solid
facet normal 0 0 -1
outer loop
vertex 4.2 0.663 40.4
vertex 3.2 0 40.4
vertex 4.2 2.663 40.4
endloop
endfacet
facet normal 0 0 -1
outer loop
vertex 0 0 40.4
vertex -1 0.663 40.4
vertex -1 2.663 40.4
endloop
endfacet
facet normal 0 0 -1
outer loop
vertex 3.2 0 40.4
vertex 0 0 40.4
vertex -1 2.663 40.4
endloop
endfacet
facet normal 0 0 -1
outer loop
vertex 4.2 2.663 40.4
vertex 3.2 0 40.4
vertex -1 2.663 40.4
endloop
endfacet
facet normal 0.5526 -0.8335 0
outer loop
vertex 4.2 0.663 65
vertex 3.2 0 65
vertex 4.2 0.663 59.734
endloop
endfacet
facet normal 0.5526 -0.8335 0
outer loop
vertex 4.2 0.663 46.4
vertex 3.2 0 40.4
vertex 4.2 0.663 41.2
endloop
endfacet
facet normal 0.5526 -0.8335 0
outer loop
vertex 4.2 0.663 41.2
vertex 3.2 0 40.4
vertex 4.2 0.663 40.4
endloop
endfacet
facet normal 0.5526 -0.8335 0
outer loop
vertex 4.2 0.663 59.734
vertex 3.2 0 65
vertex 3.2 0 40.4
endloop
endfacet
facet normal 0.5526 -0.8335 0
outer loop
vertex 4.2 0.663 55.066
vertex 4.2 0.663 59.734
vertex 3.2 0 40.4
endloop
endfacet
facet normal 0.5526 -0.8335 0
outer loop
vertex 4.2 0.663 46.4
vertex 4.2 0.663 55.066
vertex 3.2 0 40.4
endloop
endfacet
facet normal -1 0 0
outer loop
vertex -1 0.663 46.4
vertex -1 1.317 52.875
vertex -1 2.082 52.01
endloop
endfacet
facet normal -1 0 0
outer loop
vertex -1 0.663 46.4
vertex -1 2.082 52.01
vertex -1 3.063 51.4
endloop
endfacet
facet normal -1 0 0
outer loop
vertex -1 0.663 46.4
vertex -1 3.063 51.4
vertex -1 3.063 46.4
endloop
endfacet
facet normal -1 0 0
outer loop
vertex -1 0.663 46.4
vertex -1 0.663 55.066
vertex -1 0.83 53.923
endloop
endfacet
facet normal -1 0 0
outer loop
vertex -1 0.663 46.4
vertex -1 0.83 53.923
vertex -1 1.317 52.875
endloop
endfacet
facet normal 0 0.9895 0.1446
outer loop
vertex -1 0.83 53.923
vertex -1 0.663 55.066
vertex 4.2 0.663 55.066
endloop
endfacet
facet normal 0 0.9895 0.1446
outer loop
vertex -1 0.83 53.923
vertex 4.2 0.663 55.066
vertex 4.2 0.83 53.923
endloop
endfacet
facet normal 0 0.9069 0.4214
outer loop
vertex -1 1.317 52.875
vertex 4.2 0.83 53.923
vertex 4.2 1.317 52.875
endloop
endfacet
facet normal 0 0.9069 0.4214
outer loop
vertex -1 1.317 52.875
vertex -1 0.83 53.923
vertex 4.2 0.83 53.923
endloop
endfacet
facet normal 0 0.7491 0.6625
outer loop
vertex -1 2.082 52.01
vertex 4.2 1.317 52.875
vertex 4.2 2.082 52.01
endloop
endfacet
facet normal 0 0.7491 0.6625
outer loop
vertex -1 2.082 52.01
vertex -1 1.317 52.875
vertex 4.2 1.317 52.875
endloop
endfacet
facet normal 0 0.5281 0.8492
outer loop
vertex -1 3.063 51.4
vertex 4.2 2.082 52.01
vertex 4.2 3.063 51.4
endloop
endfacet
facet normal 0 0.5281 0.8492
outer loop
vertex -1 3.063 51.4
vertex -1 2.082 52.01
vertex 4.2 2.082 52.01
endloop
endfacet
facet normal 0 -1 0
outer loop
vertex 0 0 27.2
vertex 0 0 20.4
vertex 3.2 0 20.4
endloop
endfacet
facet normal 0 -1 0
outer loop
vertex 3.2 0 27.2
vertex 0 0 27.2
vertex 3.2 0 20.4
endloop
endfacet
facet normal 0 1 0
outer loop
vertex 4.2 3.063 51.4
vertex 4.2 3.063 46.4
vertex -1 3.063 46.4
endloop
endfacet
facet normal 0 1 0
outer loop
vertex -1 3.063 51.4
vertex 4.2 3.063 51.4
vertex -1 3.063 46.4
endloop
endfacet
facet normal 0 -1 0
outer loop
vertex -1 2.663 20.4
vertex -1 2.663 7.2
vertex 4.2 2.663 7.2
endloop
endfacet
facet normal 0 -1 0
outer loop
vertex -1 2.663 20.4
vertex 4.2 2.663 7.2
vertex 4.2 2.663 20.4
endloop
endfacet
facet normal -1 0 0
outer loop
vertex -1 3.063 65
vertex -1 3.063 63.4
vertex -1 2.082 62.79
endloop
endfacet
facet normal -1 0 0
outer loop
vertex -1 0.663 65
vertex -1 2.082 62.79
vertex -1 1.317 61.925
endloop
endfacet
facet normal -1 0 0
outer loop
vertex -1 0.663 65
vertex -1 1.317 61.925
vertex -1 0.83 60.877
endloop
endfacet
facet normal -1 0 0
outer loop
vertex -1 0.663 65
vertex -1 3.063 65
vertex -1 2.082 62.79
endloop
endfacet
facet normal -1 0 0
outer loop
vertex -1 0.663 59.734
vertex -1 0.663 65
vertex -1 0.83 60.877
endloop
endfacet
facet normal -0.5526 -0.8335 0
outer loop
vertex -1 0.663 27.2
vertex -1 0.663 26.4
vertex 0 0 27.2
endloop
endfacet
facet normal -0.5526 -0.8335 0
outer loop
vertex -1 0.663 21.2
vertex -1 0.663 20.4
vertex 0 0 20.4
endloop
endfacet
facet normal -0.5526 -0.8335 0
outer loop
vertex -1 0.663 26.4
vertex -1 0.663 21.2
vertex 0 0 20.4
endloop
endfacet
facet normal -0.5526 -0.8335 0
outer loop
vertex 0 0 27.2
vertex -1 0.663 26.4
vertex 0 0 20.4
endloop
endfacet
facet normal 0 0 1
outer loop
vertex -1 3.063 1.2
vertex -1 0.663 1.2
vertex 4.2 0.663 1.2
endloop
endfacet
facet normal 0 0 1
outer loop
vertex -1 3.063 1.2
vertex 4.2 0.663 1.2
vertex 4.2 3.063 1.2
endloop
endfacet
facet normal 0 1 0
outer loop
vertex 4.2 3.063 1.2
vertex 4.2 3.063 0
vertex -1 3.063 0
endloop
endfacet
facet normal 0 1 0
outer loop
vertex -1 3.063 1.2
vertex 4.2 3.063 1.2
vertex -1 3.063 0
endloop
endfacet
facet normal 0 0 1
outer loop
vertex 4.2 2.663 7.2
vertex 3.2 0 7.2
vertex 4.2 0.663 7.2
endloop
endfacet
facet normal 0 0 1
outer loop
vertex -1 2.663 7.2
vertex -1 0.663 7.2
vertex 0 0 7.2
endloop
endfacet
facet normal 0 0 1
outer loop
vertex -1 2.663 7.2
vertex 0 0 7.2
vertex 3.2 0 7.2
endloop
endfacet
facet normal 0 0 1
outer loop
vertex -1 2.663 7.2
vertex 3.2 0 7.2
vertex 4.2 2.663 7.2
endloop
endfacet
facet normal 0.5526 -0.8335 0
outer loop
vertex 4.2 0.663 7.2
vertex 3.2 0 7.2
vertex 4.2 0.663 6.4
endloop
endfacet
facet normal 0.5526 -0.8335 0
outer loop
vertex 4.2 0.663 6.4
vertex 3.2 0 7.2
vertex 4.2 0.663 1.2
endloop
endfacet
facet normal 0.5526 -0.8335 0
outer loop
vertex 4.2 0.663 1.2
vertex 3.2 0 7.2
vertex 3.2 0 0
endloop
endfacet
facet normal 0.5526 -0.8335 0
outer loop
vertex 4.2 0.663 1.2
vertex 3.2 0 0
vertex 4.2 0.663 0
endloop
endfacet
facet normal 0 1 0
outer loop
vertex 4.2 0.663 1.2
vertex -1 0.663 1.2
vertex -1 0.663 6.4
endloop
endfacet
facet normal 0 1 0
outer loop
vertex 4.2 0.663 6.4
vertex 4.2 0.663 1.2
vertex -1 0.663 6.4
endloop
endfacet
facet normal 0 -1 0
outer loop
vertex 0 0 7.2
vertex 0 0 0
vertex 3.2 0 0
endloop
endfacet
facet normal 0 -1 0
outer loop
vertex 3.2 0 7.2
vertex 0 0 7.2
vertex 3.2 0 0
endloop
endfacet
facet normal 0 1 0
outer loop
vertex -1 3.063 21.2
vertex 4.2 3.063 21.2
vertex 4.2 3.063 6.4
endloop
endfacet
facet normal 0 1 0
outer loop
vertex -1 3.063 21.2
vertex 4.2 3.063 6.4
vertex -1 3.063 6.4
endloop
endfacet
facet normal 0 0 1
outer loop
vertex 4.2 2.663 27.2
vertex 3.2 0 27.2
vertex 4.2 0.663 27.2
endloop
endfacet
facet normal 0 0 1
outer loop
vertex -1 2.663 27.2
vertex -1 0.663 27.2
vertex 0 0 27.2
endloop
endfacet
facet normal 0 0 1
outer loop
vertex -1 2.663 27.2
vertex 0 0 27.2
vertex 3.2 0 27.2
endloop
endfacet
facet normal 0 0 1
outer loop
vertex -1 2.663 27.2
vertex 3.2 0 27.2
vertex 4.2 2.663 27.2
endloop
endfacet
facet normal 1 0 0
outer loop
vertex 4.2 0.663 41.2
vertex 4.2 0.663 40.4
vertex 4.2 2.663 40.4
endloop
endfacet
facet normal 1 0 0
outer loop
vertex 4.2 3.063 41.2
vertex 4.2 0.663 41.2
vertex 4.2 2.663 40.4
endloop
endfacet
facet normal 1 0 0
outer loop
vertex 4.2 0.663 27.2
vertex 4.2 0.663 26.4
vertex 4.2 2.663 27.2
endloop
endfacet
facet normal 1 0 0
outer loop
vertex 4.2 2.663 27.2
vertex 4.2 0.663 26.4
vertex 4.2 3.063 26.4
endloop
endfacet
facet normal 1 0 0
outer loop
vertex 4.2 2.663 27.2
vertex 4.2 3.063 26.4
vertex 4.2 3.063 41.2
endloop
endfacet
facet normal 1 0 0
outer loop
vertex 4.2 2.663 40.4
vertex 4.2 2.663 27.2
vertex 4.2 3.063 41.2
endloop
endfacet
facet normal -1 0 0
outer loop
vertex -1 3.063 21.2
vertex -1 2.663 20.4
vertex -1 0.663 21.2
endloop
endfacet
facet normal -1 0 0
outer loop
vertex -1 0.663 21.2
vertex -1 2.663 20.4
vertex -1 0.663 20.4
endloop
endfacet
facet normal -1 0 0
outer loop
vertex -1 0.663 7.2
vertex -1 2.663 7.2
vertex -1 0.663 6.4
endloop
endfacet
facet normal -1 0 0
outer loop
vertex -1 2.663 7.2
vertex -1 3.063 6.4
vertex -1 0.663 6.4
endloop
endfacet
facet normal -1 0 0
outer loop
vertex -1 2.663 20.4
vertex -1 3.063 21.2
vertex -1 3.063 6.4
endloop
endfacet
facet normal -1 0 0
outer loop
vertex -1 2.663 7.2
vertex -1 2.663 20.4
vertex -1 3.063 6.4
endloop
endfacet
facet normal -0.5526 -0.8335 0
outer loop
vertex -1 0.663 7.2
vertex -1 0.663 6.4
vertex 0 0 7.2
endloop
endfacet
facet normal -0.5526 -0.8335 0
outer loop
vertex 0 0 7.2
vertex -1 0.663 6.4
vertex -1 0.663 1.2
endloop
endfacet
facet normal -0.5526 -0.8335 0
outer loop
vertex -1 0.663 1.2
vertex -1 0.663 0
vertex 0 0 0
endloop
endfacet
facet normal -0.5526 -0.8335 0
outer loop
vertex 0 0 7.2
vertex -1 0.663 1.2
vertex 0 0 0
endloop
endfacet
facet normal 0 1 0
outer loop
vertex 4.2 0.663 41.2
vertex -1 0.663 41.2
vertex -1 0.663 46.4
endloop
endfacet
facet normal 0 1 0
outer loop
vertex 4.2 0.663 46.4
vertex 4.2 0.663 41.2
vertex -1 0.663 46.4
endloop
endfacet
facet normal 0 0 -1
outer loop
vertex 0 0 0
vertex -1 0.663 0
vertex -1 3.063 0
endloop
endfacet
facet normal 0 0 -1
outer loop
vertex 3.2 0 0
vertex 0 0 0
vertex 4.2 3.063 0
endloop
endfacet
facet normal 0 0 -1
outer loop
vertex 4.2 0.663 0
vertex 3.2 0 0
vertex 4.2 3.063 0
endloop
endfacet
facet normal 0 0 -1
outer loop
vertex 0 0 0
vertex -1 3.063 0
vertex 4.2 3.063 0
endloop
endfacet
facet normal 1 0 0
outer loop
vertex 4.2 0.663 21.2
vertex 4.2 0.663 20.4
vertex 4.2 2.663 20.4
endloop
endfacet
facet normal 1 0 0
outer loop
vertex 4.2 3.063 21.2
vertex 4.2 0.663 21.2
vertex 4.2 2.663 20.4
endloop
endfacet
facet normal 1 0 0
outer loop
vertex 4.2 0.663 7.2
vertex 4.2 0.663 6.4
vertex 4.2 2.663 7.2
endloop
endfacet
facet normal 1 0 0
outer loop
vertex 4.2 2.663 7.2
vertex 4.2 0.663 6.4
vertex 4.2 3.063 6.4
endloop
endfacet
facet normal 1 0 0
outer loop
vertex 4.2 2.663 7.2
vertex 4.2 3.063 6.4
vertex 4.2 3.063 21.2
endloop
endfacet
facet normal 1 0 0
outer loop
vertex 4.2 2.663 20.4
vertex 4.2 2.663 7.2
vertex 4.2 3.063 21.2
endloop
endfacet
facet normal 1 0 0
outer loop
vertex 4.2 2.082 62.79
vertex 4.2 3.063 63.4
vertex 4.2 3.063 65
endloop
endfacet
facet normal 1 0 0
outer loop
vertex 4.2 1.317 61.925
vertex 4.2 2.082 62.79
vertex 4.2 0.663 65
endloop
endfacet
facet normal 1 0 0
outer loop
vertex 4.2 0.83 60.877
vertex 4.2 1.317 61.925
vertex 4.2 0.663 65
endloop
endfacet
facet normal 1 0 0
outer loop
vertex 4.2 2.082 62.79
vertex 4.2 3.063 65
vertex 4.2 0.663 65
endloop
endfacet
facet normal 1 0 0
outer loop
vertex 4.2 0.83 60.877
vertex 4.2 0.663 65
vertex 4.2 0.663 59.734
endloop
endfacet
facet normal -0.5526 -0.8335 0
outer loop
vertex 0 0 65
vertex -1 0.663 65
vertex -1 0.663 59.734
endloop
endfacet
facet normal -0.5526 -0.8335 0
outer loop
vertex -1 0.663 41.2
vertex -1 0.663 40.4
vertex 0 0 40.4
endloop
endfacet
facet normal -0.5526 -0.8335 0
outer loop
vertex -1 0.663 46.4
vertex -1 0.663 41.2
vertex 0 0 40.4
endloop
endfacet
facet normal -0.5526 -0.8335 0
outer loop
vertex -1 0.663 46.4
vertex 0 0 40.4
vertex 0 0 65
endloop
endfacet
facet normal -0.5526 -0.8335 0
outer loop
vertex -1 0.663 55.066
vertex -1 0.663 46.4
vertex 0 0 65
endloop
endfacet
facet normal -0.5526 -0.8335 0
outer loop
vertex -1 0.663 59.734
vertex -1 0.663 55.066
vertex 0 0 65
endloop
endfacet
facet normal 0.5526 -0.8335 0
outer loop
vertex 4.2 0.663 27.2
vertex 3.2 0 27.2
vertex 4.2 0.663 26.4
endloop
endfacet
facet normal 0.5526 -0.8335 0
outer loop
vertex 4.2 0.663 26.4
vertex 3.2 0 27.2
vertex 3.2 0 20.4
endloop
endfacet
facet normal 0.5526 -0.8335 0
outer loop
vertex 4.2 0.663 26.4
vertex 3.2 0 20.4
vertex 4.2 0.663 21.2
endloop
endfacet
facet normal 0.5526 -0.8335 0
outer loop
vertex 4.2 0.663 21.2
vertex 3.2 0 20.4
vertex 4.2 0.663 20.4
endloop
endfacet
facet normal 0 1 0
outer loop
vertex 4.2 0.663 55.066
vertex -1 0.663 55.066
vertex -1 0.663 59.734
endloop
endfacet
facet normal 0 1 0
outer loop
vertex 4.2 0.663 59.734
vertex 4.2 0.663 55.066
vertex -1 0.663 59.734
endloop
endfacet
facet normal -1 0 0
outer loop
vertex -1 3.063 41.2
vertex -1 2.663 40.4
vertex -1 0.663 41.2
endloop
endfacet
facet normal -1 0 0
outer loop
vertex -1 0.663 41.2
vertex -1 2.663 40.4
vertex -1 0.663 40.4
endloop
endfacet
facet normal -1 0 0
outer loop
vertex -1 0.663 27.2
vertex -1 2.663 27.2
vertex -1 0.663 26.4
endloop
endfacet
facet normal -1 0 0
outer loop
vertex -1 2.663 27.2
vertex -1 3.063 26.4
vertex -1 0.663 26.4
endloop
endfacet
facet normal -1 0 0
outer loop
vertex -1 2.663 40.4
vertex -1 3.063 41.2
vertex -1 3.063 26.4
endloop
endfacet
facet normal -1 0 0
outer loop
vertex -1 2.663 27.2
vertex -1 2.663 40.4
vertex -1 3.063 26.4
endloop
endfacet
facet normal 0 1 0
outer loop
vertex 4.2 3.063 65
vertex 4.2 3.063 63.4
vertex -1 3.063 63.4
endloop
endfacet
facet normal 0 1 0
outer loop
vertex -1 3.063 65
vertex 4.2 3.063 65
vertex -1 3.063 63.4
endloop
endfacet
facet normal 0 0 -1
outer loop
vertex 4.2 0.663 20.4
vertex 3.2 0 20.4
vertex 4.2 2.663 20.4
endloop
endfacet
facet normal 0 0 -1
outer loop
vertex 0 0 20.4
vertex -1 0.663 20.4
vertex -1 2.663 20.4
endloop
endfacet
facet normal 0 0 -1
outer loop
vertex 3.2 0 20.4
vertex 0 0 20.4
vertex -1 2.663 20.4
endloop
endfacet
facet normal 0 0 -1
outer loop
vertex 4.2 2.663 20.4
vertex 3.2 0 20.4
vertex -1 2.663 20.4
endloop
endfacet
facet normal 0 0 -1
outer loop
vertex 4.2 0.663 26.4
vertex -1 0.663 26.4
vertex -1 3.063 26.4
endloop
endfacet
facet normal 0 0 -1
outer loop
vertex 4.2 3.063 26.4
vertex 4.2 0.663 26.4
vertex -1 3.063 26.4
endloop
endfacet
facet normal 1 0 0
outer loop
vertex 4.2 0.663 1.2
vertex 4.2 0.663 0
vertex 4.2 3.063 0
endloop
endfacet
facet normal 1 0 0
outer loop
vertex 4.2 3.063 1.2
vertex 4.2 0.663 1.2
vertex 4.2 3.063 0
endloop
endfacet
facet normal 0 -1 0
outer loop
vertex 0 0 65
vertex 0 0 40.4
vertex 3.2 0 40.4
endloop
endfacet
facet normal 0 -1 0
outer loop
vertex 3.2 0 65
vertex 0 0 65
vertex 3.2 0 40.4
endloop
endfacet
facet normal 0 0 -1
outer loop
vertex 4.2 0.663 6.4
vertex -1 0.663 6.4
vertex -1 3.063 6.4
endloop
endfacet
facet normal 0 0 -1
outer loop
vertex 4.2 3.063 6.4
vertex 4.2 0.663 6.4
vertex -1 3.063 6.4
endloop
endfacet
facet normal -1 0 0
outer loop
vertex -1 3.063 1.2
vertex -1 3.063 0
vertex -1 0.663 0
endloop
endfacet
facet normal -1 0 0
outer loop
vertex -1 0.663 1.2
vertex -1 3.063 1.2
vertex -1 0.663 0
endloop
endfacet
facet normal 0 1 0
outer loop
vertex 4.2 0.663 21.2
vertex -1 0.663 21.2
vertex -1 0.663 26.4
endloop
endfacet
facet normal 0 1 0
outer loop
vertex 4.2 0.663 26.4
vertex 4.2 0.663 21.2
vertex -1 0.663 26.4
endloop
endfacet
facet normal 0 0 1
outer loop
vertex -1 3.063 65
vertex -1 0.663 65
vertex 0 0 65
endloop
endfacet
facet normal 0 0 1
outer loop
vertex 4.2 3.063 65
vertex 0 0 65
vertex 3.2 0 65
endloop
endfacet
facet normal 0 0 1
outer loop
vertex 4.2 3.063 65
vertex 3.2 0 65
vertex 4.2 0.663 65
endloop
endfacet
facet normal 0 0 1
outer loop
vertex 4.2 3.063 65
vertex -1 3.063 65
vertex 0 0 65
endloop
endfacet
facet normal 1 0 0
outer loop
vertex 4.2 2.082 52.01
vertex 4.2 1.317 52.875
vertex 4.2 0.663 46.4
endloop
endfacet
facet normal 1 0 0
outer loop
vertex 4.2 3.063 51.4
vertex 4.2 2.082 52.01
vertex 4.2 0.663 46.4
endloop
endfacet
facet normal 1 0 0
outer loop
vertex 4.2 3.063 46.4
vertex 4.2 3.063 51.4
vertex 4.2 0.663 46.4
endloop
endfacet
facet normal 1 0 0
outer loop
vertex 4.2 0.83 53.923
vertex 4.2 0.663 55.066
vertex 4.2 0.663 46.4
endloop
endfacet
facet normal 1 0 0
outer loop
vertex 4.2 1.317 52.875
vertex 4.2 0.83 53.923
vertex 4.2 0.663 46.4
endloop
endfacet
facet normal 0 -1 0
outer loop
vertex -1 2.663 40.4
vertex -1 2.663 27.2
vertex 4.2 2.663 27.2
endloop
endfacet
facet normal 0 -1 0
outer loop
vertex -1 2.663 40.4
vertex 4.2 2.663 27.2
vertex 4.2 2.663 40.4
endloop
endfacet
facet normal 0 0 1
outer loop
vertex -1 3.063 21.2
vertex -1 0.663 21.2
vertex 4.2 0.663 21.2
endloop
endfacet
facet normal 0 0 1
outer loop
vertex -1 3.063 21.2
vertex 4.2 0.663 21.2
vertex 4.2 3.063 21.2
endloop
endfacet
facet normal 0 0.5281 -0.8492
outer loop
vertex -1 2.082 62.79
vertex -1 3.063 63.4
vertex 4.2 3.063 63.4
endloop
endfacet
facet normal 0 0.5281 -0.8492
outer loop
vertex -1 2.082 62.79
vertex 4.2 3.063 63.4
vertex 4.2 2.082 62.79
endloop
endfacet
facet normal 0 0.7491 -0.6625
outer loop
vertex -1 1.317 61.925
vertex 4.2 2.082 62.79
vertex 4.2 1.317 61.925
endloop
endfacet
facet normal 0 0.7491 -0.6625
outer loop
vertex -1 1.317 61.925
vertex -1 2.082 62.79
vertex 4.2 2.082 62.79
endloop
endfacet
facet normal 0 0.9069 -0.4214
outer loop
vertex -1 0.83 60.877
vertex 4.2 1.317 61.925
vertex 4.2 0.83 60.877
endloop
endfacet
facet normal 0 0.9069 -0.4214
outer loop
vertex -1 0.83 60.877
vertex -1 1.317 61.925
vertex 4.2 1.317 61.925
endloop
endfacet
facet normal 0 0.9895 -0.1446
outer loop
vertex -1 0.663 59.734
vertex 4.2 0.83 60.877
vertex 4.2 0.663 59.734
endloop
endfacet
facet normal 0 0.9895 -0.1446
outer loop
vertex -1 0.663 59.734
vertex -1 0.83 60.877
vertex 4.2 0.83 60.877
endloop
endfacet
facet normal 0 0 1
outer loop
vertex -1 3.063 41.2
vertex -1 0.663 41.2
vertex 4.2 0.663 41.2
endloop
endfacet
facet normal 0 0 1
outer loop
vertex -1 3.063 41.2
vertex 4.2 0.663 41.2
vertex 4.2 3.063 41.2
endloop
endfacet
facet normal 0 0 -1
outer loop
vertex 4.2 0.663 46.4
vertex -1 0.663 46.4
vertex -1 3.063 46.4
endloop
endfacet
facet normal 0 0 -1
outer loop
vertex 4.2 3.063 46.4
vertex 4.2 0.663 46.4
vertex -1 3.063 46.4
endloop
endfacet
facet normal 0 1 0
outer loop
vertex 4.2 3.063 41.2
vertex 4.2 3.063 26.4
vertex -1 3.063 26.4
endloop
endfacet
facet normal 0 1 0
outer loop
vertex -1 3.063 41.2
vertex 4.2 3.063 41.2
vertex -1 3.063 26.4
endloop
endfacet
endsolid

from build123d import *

# Parameters (mm, degrees)
BOSS_EXTRUDE1_DEPTH = 65
SKETCH2_W           = 5.2
SKETCH2_H           = 2.4
CUT_EXTRUDE1_DEPTH  = 6
LPATTERN1_COUNT     = 3
LPATTERN1_PITCH     = 20
SKETCH3_W           = 12
SKETCH3_H           = 2.4
CUT_EXTRUDE2_DEPTH  = 6
FILLET1_R           = 4
FILLET2_R           = 4
SKETCH5_W           = 13.2
SKETCH5_H           = 3.1
CUT_EXTRUDE3_DEPTH  = 10
LPATTERN2_COUNT     = 2
LPATTERN2_PITCH     = 20


with BuildPart() as part:
    # Sketch1 → Boss-Extrude1 (new body)
    with BuildSketch(Plane.XY):
        Polygon((0, 0), (3.2, 0), (4.2, 0.663324958), (4.2, 3.063324958), (-1, 3.063324958), (-1, 0.663324958), align=None)
    extrude(amount=BOSS_EXTRUDE1_DEPTH)

    # Sketch2 → Cut-Extrude1 (cut)
    with BuildSketch(Plane.ZY.offset(1)):
        with Locations((3.8, 1.863324958)):
            Rectangle(SKETCH2_W, SKETCH2_H)
    cut_extrude1 = extrude(amount=-CUT_EXTRUDE1_DEPTH, mode=Mode.SUBTRACT)

    # LPattern1: Cut-Extrude1 ×3
    with Locations(*[(0, 0, i * LPATTERN1_PITCH) for i in range(1, LPATTERN1_COUNT)]):
        add(cut_extrude1, mode=Mode.SUBTRACT)

    # Sketch3 → Cut-Extrude2 (cut)
    with BuildSketch(Plane.ZY.offset(1)):
        with Locations((57.4, 1.863324958)):
            Rectangle(SKETCH3_W, SKETCH3_H)
    extrude(amount=-CUT_EXTRUDE2_DEPTH, mode=Mode.SUBTRACT)

    # Fillet1
    # the kernel refuses this fillet: 4 mm, written as the material it adds along each edge
    with BuildSketch(Plane(origin=(-1, 0.663324958, 51.4), x_dir=(0, 0, 1), z_dir=(1, 0, 0))) as fillet1_piece_1_section:
        with BuildLine():
            CenterArc((3.666060556, -4), FILLET1_R, 90, 66.421821522)
            Line((0, -2.4), (-0.073321211, -2.368))
            ThreePointArc((-0.073321211, -2.368), (-0.08, -1.2), (-0.08, 0))
            Line((-0.08, 0), (0, 0.08))
            Line((0, 0.08), (3.666060556, 0.08))
            Line((3.666060556, 0.08), (3.666060556, 0))
        make_face()
    fillet1_piece_1 = extrude(amount=5.2, mode=Mode.PRIVATE)
    fillet1_piece_1 = split(fillet1_piece_1, bisect_by=Plane(origin=(0.518931728, -0.344220367, 52.290586237), z_dir=(0.5527707983925672, 0.833333333333333, 0)), keep=Keep.TOP, mode=Mode.PRIVATE)
    fillet1_piece_1 = split(fillet1_piece_1, bisect_by=Plane(origin=(2.681068272, -0.344220367, 52.290586237), z_dir=(-0.5527707983925666, 0.8333333333333335, 0)), keep=Keep.TOP, mode=Mode.PRIVATE)
    add(fillet1_piece_1)

    # Fillet2
    # the kernel refuses this fillet: 4 mm, written as the material it adds along each edge
    with BuildSketch(Plane(origin=(-1, 0.663324958, 63.4), x_dir=(0, 1, 0), z_dir=(1, 0, 0))) as fillet2_piece_1_section:
        with BuildLine():
            CenterArc((4, -3.666060556), FILLET2_R, 113.578178478, 66.421821522)
            Line((0, -3.666060556), (-0.08, -3.666060556))
            Line((-0.08, -3.666060556), (-0.08, 0))
            Line((-0.08, 0), (0, 0.08))
            ThreePointArc((0, 0.08), (1.2, 0.08), (2.368, 0.073321211))
            Line((2.368, 0.073321211), (2.4, 0))
        make_face()
    fillet2_piece_1 = extrude(amount=5.2, mode=Mode.PRIVATE)
    fillet2_piece_1 = split(fillet2_piece_1, bisect_by=Plane(origin=(2.681068272, -0.344220367, 62.509413763), z_dir=(-0.5527707983925666, 0.8333333333333335, 0)), keep=Keep.TOP, mode=Mode.PRIVATE)
    fillet2_piece_1 = split(fillet2_piece_1, bisect_by=Plane(origin=(0.518931728, -0.344220367, 62.509413763), z_dir=(0.5527707983925672, 0.833333333333333, 0)), keep=Keep.TOP, mode=Mode.PRIVATE)
    add(fillet2_piece_1)

    # Sketch5 → Cut-Extrude3 (cut)
    with BuildSketch(Plane.ZY.offset(1)):
        with Locations((13.8, 1.113324958)):
            Rectangle(SKETCH5_W, SKETCH5_H)
    cut_extrude3 = extrude(amount=-CUT_EXTRUDE3_DEPTH, mode=Mode.SUBTRACT)

    # LPattern2: Cut-Extrude3 ×2
    with Locations(*[(0, 0, i * LPATTERN2_PITCH) for i in range(1, LPATTERN2_COUNT)]):
        add(cut_extrude3, mode=Mode.SUBTRACT)


solid = part.part
